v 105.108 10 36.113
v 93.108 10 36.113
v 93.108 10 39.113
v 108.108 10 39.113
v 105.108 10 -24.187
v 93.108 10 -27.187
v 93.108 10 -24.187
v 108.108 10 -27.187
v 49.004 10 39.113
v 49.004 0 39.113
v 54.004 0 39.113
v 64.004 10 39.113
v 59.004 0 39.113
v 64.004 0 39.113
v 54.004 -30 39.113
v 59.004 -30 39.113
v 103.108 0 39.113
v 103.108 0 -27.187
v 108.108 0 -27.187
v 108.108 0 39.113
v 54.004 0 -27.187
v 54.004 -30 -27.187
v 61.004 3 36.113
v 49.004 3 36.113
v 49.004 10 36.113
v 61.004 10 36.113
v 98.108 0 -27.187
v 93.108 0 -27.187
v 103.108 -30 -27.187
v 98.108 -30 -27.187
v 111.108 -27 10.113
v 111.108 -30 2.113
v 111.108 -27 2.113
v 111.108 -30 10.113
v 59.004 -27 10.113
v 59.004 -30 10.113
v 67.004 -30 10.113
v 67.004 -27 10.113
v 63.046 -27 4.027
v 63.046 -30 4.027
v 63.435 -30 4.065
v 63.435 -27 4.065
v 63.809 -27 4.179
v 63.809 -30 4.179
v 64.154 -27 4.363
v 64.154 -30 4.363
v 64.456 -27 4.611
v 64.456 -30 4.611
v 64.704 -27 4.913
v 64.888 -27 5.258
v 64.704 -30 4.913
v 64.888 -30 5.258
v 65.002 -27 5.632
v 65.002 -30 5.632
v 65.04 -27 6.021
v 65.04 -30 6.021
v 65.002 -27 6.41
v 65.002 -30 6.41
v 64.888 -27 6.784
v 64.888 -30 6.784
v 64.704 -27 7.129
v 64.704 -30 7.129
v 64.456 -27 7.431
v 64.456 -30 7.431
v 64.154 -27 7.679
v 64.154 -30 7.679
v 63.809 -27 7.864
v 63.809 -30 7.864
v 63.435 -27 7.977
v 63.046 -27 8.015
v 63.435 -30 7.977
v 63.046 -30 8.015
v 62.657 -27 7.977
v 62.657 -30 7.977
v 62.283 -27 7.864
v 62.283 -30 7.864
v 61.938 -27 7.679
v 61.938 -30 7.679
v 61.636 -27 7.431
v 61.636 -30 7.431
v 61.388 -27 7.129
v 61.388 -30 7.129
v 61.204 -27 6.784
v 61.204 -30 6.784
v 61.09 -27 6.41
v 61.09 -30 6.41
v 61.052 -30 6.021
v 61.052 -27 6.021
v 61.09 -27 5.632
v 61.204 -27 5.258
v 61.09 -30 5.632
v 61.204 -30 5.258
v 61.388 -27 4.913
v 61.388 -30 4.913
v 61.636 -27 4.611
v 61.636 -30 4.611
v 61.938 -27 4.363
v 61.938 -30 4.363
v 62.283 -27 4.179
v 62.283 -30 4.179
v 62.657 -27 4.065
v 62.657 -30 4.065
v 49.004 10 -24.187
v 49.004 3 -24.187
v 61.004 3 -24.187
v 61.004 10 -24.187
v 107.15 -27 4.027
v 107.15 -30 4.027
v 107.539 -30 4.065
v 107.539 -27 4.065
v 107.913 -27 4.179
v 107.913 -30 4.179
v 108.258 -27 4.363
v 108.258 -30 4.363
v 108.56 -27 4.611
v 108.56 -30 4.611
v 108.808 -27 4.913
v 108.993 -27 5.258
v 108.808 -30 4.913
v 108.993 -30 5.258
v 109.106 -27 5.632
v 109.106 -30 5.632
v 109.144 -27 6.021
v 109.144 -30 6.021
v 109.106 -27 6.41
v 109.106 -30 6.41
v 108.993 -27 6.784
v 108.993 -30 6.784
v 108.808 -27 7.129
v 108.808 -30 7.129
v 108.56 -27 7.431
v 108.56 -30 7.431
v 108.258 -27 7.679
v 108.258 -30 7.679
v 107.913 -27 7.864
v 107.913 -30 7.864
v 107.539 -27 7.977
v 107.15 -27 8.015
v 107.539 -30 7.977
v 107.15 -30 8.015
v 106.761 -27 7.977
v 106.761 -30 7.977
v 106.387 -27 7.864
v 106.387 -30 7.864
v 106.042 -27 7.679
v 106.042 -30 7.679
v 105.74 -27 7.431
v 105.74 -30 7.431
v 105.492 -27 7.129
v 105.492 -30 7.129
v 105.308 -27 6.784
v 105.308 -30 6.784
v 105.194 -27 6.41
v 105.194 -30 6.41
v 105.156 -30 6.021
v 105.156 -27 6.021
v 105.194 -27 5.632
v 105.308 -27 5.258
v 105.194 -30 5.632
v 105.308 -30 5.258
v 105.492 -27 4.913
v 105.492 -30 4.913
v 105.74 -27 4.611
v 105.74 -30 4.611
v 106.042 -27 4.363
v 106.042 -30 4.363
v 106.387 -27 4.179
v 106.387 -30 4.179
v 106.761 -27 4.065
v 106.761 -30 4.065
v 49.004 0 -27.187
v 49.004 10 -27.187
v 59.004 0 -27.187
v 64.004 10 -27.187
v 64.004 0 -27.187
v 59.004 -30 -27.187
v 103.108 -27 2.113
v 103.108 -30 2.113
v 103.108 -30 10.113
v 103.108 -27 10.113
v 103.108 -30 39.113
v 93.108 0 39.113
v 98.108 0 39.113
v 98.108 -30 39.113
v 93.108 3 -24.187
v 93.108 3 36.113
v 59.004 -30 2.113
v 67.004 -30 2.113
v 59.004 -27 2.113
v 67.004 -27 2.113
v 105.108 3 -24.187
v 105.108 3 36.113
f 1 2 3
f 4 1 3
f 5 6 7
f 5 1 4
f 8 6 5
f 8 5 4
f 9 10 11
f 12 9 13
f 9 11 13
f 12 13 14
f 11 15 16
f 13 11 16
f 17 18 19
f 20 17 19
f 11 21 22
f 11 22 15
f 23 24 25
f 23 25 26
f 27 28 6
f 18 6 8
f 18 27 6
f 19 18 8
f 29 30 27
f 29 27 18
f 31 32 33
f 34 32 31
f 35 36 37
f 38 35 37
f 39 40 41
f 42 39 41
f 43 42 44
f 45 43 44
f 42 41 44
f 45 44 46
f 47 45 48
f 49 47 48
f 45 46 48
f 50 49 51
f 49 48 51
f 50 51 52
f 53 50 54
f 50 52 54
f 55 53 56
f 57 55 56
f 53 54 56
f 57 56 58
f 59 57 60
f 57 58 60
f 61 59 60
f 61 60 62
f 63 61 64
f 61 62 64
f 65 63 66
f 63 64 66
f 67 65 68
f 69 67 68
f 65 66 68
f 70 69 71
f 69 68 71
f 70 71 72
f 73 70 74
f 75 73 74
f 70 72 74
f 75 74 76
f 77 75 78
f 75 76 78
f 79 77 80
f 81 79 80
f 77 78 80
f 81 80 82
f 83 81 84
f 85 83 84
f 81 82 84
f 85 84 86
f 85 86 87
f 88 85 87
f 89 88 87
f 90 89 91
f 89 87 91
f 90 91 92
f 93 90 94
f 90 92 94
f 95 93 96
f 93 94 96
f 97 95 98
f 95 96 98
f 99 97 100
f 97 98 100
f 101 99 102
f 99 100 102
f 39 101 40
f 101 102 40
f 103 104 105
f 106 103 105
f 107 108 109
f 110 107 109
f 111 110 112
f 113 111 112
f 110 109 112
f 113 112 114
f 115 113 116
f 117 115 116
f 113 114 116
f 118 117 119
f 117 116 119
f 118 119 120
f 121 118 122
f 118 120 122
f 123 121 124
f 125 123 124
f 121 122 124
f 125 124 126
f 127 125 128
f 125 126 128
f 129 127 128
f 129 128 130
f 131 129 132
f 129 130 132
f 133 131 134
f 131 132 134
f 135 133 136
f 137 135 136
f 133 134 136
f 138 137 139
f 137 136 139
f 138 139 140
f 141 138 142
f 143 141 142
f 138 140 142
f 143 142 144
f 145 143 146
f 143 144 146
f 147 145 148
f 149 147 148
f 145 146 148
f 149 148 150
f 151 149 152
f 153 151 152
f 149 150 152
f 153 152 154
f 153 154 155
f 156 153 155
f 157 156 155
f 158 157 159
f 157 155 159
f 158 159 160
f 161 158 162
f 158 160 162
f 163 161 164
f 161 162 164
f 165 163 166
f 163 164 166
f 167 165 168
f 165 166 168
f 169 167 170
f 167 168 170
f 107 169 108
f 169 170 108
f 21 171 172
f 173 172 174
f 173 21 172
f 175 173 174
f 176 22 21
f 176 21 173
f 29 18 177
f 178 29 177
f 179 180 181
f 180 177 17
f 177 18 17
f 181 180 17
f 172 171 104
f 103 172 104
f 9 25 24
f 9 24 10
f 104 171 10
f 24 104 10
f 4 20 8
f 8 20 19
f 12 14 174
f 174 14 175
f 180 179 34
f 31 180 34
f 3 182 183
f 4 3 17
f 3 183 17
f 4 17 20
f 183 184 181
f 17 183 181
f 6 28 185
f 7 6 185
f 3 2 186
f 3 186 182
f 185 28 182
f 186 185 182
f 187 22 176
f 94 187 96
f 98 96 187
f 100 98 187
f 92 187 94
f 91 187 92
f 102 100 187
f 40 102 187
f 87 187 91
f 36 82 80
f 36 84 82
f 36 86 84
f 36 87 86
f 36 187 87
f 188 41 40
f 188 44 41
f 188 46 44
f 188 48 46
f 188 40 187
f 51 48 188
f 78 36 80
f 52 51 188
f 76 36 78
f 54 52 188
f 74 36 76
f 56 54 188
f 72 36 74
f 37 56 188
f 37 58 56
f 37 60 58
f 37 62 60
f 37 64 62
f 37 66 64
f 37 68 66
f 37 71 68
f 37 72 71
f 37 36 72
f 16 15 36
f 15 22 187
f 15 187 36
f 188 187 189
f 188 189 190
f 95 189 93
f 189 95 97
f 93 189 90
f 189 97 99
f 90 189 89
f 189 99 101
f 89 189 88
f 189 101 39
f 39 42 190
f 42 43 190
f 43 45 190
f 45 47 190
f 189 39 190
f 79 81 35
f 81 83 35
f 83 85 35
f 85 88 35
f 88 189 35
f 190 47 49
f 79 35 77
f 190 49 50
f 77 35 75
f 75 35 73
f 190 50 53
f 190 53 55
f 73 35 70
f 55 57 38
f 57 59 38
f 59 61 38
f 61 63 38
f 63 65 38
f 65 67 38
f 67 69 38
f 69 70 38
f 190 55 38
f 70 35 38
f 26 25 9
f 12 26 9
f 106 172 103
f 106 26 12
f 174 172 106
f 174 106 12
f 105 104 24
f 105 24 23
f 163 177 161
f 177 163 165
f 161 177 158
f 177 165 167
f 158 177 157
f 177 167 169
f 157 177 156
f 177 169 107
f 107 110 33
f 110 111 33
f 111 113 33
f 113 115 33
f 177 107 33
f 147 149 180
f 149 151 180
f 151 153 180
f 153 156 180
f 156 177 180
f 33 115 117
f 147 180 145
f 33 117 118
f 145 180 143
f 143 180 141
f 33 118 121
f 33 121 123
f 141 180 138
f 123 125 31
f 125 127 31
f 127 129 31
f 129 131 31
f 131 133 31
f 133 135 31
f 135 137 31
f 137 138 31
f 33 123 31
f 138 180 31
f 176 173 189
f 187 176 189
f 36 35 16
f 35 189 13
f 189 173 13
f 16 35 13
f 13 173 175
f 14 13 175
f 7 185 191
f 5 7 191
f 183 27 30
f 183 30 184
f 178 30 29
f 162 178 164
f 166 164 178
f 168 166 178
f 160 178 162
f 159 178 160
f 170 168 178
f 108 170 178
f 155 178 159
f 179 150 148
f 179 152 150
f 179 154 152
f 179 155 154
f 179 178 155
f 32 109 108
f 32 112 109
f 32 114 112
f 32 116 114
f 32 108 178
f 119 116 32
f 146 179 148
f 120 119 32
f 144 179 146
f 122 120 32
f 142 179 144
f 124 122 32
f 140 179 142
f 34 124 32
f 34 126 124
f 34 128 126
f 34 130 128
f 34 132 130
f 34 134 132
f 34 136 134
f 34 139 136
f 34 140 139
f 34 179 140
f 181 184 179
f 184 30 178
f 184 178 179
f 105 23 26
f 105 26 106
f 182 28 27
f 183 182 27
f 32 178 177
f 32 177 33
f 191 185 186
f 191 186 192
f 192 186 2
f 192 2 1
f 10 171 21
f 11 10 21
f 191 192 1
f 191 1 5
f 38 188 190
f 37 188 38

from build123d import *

# Parameters (mm, degrees)
SKETCH1_W               = 177
SKETCH1_H               = 66.3
BOSS_EXTRUDE1_DEPTH     = 10
CUT_EXTRUDE1_DEPTH      = 120.991628317
CUT_EXTRUDE1_DEPTH_BACK = 7
SKETCH2_W               = 171
SKETCH2_H               = 60.3
SKETCH3_W               = 5
SKETCH3_H               = 66.3
BOSS_EXTRUDE2_DEPTH     = 30
SKETCH4_W               = 147
SKETCH4_H               = 66.3
CUT_EXTRUDE2_DEPTH      = 30
SKETCH5_W               = 8
SKETCH5_H               = 8
SKETCH5_R               = 1.899919422
SKETCH5_R_2             = 1.99416254
BOSS_EXTRUDE3_DEPTH     = 3
SKETCH6_W               = 53.200668984
SKETCH6_H               = 118.475248661
CUT_EXTRUDE3_DEPTH      = 137.93353889


with BuildPart() as part:
    # Sketch1 → Boss-Extrude1 (new body)
    with BuildSketch(Plane(origin=(0, 0, 0), x_dir=(1, 0, 0), z_dir=(0, 1, 0))):
        with Locations((-24.496138181, -5.963471112)):
            Rectangle(SKETCH1_W, SKETCH1_H)
    extrude(amount=BOSS_EXTRUDE1_DEPTH)

    # Sketch2 → Cut-Extrude1 (cut, two sides: drawn at the far end of the back side and taken through both)
    with BuildSketch(Plane(origin=(0, 10, 0), x_dir=(1, 0, 0), z_dir=(0, 1, 0)).offset(-CUT_EXTRUDE1_DEPTH_BACK)):
        with Locations((-24.496138181, -5.963471112)):
            Rectangle(SKETCH2_W, SKETCH2_H)
    extrude(amount=CUT_EXTRUDE1_DEPTH + CUT_EXTRUDE1_DEPTH_BACK, mode=Mode.SUBTRACT)

    # Sketch3 → Boss-Extrude2 (add)
    with BuildSketch(Plane.XZ):
        with Locations((-105.496138181, 5.963471112)):
            Rectangle(SKETCH3_W, SKETCH3_H)
        with Locations((56.503861819, 5.963471112)):
            Rectangle(SKETCH3_W, SKETCH3_H)
    extrude(amount=BOSS_EXTRUDE2_DEPTH)

    # Sketch4 → Cut-Extrude2 (cut)
    with BuildSketch(Plane.XZ):
        with Locations((-24.496138181, 5.963471112)):
            Rectangle(SKETCH4_W, SKETCH4_H)
    extrude(amount=-CUT_EXTRUDE2_DEPTH, mode=Mode.SUBTRACT)


with BuildPart() as cut_extrude2_piece_1:
    # of the separate pieces the step leaves, piece 1, a body of its own (cut_extrude2_pieces)
    add(part.part.solids().sort_by_distance((-97.996138181, 0, 39.113471112))[0])



with BuildPart() as cut_extrude2_piece_2:
    # of the separate pieces the step leaves, piece 2, a body of its own (cut_extrude2_pieces)
    add(part.part.solids().sort_by_distance((64.003861819, 0, 39.113471112))[0])


with BuildPart() as cut_extrude2_piece_1_1:
    add(cut_extrude2_piece_1.part)

    add(cut_extrude2_piece_2.part)  # Boss-Extrude3 merges Cut-Extrude2 piece 2
    # Sketch5 → Boss-Extrude3 (add)
    # profile 1 of 2: a face of its own
    with BuildSketch(Plane.XZ.offset(30)):
        with Locations((-111.996138181, 6.113471112)):
            Rectangle(SKETCH5_W, SKETCH5_H)
        with Locations(Location((-111.976969615, 5.996435965, 0), (0, 0, 270))):
            Circle(SKETCH5_R, mode=Mode.SUBTRACT)
    # profile 2 of 2: a face of its own
    with BuildSketch(Plane.XZ.offset(30)):
        with Locations((63.003861819, 6.113471112)):
            Rectangle(SKETCH5_W, SKETCH5_H)
        with Locations(Location((63.046032676, 6.021165831, 0), (0, 0, 270))):
            Circle(SKETCH5_R_2, mode=Mode.SUBTRACT)
    extrude(amount=-BOSS_EXTRUDE3_DEPTH)

    # Sketch6 → Cut-Extrude3 (cut, through all)
    with BuildSketch(Plane(origin=(0, 0, -27.186528888), x_dir=(-1, 0, 0), z_dir=(0, 0, -1))):
        with Locations((95.157985418, 15.958745635)):
            Rectangle(SKETCH6_W, SKETCH6_H)
    extrude(amount=-CUT_EXTRUDE3_DEPTH, mode=Mode.SUBTRACT)


with BuildPart() as body_2:
    # Body-Move/Copy1: copy of Cut-Extrude2 piece 1
    add(cut_extrude2_piece_1_1.part.moved(Location((44.104133086, 0, 0))))


solid = Compound([cut_extrude2_piece_1_1.part, body_2.part])
